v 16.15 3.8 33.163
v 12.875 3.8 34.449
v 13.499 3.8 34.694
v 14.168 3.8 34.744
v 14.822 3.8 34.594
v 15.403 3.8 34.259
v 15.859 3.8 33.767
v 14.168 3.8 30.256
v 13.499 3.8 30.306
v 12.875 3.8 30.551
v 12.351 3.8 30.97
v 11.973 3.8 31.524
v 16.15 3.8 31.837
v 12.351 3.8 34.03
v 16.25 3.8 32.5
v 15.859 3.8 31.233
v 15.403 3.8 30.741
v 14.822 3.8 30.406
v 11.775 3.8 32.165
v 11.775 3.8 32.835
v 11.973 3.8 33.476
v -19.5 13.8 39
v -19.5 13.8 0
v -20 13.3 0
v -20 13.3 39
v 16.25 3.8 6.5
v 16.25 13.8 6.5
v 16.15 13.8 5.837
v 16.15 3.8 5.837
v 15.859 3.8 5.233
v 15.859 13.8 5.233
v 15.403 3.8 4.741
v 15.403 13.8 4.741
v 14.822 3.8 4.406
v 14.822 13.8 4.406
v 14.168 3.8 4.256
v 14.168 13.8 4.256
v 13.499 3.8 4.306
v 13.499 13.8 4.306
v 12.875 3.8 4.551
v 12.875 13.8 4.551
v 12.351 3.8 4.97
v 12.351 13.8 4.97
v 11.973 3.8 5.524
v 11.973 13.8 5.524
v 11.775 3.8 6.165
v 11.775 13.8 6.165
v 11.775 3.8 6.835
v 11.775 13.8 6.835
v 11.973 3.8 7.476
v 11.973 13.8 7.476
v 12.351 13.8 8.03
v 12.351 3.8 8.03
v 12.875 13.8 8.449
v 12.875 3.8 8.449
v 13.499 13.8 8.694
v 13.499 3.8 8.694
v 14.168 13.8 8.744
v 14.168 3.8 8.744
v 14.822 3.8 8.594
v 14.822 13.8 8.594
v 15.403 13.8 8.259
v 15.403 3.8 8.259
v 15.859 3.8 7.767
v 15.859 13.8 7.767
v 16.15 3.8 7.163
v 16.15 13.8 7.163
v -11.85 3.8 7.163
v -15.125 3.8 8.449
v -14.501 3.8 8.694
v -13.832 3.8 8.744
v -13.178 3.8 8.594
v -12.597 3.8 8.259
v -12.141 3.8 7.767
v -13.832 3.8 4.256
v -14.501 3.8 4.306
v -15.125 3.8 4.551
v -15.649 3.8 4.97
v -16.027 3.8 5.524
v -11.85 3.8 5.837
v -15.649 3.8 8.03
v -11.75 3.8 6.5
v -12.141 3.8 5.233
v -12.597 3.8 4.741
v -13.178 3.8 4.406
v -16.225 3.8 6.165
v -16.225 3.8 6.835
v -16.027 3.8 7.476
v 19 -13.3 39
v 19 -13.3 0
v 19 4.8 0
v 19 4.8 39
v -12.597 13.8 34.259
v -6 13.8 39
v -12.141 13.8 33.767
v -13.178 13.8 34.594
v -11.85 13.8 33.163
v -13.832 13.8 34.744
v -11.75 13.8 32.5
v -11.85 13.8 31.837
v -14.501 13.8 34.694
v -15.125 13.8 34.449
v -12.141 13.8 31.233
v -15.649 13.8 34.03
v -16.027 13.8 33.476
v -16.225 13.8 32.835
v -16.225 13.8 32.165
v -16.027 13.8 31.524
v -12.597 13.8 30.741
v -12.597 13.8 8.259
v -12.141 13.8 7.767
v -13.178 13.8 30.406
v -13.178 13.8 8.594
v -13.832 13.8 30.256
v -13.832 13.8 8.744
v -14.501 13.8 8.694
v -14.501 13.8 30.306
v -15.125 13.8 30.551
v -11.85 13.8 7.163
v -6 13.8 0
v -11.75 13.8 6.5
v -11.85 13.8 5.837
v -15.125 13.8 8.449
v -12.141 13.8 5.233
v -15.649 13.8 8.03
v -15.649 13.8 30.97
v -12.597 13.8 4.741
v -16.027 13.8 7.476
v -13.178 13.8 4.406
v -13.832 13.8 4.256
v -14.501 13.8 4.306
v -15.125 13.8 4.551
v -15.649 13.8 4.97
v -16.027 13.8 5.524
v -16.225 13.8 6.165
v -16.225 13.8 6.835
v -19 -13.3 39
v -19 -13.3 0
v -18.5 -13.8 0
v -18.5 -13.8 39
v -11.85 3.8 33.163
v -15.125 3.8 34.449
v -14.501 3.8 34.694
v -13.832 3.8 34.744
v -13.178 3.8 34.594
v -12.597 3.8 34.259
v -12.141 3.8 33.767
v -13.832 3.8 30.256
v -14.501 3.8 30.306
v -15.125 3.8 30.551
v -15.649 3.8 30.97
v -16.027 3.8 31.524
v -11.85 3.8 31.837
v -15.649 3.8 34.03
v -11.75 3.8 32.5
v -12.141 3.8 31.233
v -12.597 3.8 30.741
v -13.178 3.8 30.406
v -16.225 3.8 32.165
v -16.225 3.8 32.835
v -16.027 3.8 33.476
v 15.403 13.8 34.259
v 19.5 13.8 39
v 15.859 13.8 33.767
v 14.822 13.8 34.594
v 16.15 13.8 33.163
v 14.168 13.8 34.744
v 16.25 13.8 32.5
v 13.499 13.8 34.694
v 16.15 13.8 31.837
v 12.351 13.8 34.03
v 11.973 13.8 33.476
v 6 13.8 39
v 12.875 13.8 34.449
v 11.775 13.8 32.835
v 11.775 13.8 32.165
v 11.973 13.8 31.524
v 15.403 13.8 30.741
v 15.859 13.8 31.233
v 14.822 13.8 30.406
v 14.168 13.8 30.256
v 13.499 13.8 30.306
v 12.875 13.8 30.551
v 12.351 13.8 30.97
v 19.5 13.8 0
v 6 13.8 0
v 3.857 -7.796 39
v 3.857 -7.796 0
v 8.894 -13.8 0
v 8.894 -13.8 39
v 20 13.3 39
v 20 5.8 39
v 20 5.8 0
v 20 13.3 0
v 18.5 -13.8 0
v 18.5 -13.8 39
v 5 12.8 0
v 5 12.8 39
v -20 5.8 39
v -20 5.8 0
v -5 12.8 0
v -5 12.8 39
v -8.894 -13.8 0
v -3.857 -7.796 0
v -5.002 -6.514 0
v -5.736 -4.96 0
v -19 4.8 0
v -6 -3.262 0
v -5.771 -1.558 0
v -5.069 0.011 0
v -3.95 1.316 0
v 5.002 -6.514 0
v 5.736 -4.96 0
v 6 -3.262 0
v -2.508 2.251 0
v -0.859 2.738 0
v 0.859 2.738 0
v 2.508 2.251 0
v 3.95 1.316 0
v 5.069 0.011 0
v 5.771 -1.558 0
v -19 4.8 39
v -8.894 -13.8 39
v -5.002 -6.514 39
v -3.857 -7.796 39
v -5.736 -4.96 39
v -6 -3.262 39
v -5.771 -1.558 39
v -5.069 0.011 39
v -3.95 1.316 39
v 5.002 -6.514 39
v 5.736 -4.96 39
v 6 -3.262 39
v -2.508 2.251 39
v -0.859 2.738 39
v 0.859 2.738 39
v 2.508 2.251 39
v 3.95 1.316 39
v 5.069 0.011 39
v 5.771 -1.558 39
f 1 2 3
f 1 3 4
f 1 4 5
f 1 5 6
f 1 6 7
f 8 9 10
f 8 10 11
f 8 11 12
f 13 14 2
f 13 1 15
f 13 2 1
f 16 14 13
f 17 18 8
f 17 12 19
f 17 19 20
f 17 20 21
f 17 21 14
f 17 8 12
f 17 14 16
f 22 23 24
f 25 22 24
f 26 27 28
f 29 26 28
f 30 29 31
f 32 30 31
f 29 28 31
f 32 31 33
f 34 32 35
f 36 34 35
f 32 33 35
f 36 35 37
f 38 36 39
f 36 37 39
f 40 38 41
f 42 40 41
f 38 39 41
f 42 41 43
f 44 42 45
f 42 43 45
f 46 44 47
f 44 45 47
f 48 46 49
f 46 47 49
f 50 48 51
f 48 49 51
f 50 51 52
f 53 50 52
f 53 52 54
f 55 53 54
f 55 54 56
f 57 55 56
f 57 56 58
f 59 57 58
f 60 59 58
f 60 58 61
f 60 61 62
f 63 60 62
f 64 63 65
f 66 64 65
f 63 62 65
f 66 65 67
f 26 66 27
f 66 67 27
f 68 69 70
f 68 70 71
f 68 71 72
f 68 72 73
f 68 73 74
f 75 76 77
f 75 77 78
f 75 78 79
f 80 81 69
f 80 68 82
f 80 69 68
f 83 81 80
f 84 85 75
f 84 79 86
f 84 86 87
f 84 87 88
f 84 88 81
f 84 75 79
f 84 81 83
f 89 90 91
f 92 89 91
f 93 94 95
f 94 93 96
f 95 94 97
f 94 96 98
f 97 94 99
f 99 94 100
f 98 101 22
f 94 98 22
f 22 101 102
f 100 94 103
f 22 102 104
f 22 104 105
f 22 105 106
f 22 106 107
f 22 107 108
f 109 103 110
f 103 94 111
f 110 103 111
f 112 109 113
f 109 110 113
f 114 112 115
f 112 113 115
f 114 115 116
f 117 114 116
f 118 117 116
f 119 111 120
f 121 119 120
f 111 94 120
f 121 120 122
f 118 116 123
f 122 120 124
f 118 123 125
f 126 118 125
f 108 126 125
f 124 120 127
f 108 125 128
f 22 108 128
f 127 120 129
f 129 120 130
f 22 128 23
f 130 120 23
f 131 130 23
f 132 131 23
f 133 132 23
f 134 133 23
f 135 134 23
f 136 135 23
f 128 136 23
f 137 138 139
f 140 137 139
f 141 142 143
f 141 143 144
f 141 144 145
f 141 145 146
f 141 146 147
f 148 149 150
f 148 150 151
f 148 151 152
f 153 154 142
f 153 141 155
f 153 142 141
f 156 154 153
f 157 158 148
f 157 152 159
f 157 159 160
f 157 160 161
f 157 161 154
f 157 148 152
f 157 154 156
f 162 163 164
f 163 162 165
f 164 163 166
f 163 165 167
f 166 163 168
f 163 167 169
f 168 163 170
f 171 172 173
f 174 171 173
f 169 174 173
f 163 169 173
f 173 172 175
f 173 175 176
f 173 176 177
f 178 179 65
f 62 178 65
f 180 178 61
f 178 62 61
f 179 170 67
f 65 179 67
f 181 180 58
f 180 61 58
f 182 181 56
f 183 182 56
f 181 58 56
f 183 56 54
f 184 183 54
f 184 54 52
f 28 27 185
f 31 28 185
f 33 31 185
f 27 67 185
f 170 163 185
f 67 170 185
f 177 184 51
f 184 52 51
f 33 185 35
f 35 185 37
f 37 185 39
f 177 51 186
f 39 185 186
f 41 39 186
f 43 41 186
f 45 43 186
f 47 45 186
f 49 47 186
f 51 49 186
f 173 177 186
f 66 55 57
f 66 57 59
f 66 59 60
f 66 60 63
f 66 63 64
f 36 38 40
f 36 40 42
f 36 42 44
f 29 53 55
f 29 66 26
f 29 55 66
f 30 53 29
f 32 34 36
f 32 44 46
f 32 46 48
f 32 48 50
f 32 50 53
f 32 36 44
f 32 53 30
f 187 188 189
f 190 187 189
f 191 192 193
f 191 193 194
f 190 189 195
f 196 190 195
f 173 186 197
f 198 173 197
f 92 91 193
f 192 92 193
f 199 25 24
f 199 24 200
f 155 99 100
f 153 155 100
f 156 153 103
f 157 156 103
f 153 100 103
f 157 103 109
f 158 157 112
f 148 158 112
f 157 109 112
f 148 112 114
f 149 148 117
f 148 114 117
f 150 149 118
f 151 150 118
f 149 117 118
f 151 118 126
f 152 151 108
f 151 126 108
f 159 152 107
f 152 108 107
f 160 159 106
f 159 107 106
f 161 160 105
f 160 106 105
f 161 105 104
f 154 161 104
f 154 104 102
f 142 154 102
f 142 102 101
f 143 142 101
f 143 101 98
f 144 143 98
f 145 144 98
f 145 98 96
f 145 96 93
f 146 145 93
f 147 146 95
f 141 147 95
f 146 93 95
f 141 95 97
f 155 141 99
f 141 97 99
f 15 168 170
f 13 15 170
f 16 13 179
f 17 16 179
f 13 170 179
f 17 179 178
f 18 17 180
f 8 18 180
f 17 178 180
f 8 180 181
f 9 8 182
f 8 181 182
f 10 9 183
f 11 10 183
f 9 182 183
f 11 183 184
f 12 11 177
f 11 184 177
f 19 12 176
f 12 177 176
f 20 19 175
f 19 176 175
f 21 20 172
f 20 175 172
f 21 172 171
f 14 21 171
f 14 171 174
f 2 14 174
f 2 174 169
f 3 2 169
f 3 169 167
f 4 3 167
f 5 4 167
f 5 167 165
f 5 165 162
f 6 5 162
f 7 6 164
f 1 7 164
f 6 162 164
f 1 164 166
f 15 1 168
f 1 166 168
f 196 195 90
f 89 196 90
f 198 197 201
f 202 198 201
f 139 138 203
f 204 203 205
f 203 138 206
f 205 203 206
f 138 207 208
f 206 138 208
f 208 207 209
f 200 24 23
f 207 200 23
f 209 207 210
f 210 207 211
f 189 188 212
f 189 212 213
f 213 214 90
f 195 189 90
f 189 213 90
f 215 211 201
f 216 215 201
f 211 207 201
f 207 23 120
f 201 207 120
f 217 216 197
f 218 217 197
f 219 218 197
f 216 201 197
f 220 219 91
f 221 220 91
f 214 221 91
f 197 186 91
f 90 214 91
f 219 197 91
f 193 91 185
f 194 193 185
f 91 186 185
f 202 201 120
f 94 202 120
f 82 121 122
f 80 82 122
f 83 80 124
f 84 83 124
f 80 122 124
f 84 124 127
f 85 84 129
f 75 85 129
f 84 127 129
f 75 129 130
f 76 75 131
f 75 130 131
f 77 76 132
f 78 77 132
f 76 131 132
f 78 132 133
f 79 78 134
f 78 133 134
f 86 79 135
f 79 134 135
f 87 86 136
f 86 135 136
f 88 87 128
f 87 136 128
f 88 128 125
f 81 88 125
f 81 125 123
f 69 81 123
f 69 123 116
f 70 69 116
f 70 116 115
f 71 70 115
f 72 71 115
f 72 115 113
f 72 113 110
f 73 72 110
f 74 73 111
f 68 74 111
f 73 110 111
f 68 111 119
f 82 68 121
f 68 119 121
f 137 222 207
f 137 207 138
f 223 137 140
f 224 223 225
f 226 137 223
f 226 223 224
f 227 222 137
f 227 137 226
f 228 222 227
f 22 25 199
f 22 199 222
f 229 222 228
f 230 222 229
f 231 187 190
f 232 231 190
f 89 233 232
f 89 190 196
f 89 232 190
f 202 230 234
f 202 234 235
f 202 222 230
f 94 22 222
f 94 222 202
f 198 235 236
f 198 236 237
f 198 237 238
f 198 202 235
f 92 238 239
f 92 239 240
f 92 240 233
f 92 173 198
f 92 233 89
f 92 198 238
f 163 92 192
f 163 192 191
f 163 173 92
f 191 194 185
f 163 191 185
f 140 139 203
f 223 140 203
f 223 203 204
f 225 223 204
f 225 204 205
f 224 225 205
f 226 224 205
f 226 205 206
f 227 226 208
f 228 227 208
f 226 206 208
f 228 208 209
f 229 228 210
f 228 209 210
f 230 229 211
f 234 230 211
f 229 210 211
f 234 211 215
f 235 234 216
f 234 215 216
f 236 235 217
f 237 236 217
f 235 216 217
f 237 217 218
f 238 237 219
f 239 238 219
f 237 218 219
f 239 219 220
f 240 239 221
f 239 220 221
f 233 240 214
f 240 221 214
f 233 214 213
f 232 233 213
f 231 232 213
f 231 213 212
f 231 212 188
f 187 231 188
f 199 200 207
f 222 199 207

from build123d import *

# Parameters (mm, degrees)
EXTRUDE1_DEPTH = 39
SKETCH2_R      = 2.25
EXTRUDE2_DEPTH = 10


with BuildPart() as part:
    # Sketch1 → Extrude1 (new body)
    with BuildSketch(Plane.XY):
        with BuildLine():
            Line((-18.5, -13.8), (-8.89445609, -13.8))
            Line((-8.89445609, -13.8), (-3.856725658, -7.796266659))
            ThreePointArc((-3.856725658, -7.796266659), (0, 2.8), (3.856725658, -7.796266659))
            Line((3.856725658, -7.796266659), (8.89445609, -13.8))
            Line((8.89445609, -13.8), (18.5, -13.8))
            Line((18.5, -13.8), (19, -13.3))
            Line((19, -13.3), (19, 4.8))
            Line((19, 4.8), (20, 5.8))
            Line((20, 5.8), (20, 13.3))
            Line((20, 13.3), (19.5, 13.8))
            Line((19.5, 13.8), (6, 13.8))
            Line((6, 13.8), (5, 12.8))
            Line((5, 12.8), (-5, 12.8))
            Line((-5, 12.8), (-6, 13.8))
            Line((-6, 13.8), (-19.5, 13.8))
            Line((-19.5, 13.8), (-20, 13.3))
            Line((-20, 13.3), (-20, 5.8))
            Line((-20, 5.8), (-19, 4.8))
            Line((-19, 4.8), (-19, -13.3))
            Line((-19, -13.3), (-18.5, -13.8))
        make_face()
    extrude(amount=EXTRUDE1_DEPTH)

    # Sketch2 → Extrude2 (cut)
    with BuildSketch(Plane(origin=(0, 13.8, 0), x_dir=(1, 0, 0), z_dir=(0, 1, 0))):
        with Locations((-14, -6.5)):
            Circle(SKETCH2_R)
        with Locations((-14, -32.5)):
            Circle(SKETCH2_R)
        with Locations((14, -32.5)):
            Circle(SKETCH2_R)
        with Locations((14, -6.5)):
            Circle(SKETCH2_R)
    extrude(amount=-EXTRUDE2_DEPTH, mode=Mode.SUBTRACT)


solid = part.part
